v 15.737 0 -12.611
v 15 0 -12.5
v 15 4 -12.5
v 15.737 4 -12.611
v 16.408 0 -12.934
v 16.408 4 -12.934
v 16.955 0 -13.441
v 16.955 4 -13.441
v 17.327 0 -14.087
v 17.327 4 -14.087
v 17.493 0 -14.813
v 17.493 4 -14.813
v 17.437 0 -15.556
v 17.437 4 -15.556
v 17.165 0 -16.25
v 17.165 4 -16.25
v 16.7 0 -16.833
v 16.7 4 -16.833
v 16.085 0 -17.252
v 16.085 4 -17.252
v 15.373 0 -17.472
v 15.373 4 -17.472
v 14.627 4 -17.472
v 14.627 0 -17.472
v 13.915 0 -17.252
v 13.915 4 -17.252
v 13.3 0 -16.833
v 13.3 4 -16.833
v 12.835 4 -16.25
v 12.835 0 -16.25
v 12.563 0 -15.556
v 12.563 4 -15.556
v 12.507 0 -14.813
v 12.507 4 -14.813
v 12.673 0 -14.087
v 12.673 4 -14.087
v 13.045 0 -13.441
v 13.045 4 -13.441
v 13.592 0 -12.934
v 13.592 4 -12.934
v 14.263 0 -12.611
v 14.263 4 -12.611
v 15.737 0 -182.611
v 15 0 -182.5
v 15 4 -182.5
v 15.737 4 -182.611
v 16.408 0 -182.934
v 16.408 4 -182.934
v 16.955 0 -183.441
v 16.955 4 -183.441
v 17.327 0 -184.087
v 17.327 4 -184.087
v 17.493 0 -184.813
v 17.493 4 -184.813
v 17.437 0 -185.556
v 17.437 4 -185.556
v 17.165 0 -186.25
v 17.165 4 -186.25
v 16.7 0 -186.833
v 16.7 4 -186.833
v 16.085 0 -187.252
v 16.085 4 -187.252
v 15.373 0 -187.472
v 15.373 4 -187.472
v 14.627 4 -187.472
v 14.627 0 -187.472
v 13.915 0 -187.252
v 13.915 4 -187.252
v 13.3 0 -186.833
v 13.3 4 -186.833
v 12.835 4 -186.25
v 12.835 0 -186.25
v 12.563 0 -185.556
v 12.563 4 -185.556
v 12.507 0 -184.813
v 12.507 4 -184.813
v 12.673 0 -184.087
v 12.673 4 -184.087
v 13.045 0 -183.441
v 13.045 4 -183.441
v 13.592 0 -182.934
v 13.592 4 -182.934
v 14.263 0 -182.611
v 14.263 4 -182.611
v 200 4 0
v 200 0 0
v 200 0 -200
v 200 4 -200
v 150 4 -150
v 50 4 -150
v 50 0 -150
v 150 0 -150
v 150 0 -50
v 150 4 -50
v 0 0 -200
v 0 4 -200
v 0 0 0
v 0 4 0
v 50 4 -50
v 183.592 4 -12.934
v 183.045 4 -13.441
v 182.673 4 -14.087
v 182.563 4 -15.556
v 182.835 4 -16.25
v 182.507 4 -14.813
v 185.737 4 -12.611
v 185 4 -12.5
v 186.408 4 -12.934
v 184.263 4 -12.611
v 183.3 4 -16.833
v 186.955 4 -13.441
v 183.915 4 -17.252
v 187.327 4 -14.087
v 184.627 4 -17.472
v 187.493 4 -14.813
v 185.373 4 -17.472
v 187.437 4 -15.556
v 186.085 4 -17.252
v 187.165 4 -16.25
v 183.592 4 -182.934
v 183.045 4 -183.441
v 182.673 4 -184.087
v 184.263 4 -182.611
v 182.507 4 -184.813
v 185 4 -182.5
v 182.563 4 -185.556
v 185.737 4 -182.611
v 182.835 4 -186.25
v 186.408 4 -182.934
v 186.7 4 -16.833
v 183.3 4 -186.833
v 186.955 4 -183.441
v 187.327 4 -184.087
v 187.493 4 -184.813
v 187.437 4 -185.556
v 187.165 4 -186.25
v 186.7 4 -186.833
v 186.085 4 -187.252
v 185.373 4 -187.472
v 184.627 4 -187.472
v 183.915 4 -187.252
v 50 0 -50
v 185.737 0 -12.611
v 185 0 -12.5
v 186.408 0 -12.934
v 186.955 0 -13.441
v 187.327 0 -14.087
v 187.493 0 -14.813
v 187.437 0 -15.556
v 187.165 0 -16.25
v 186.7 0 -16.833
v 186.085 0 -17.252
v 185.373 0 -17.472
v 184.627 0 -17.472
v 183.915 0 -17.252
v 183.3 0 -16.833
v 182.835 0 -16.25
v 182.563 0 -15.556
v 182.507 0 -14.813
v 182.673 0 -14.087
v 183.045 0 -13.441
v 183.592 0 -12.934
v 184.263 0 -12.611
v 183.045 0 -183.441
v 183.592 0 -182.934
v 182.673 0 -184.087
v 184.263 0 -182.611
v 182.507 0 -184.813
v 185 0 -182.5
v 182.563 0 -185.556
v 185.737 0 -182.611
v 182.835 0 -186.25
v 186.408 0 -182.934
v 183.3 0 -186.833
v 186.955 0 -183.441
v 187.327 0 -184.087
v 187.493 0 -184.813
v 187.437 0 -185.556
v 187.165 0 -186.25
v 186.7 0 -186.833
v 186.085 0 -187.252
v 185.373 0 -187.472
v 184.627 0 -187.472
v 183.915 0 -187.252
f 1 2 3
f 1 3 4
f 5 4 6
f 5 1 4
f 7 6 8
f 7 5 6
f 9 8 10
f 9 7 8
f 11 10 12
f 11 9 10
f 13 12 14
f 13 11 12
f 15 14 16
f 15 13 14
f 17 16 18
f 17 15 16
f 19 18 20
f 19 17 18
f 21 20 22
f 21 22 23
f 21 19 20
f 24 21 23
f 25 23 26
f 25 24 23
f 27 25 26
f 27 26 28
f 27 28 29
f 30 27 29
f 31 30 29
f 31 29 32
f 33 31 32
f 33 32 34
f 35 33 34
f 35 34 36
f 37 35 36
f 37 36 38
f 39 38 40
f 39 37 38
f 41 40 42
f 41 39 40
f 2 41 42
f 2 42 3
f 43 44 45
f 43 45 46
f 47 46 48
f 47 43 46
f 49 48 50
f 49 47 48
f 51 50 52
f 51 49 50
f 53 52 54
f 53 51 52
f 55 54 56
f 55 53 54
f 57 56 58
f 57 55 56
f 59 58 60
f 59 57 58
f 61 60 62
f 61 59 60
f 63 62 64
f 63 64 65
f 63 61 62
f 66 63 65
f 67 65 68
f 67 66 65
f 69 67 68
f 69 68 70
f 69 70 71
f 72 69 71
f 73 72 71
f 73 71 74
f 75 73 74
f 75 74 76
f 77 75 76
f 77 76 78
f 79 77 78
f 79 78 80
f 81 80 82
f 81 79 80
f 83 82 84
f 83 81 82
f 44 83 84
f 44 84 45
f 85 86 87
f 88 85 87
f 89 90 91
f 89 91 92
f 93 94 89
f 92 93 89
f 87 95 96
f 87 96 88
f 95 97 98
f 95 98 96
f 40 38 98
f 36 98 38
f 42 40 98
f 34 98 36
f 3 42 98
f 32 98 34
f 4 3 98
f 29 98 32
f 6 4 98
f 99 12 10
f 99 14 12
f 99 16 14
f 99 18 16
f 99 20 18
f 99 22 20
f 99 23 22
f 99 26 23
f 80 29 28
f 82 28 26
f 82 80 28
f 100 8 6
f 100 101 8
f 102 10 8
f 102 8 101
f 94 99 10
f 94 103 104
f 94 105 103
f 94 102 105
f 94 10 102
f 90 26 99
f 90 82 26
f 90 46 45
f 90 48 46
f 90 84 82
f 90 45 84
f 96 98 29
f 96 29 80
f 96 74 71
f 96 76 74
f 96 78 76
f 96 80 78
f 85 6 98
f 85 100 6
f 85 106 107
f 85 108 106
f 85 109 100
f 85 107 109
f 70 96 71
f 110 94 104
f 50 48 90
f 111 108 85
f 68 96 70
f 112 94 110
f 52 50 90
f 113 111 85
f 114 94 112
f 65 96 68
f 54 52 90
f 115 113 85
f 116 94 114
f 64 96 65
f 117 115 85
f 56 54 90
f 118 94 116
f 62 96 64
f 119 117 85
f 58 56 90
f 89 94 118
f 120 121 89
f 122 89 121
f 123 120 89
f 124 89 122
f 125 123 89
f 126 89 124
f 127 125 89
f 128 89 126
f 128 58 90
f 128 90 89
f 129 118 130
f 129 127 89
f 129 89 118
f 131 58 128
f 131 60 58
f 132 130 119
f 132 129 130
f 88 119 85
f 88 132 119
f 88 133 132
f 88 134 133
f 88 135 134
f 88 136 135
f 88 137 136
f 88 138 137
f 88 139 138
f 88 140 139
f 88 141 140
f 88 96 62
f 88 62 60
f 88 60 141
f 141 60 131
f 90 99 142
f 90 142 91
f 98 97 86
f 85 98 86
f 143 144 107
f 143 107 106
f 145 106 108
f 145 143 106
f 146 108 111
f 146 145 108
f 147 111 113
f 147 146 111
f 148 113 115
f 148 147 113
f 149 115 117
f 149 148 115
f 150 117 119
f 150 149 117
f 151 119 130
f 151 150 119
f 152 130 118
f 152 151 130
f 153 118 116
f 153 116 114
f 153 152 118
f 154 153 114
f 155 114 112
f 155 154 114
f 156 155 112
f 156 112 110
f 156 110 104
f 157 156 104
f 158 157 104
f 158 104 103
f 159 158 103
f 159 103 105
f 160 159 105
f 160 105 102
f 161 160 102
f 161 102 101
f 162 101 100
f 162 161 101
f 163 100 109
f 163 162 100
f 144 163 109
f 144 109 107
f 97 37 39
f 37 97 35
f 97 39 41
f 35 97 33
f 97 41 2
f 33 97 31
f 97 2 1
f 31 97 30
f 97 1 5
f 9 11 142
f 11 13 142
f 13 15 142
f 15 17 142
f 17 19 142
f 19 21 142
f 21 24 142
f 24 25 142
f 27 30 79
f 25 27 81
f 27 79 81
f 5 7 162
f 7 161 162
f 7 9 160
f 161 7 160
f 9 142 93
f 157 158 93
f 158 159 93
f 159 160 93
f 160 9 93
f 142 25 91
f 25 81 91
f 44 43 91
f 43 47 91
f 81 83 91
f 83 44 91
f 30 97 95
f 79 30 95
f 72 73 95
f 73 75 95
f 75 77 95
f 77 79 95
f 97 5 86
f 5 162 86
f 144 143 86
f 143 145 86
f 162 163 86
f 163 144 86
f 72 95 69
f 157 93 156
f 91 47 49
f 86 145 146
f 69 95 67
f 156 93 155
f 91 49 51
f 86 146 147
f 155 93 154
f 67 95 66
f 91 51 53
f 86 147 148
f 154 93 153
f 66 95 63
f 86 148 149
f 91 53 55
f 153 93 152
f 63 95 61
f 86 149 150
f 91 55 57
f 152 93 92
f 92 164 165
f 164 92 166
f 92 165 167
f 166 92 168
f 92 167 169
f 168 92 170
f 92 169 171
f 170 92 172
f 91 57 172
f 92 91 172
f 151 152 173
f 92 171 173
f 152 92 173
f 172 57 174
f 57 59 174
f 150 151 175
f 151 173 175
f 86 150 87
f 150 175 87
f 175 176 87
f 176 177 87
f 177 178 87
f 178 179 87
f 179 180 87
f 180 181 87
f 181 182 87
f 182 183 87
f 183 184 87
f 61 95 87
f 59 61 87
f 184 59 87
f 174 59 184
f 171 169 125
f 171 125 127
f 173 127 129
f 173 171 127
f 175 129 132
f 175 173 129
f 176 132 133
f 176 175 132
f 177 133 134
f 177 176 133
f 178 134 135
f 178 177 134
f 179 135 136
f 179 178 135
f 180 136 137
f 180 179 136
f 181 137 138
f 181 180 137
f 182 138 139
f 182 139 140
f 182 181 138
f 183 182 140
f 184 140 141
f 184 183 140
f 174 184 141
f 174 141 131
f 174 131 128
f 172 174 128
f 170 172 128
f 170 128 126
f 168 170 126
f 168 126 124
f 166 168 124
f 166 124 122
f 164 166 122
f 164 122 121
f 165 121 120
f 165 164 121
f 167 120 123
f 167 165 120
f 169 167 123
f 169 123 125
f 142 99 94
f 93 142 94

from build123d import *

# Parameters (mm, degrees)
CROQUIS1_W              = 200
CROQUIS1_H              = 200
CROQUIS1_R              = 2.5
SALIENTE_EXTRUIR1_DEPTH = 4
CROQUIS2_W              = 100
CROQUIS2_H              = 100
CORTAR_EXTRUIR1_DEPTH   = 4


with BuildPart() as part:
    # Croquis1 → Saliente-Extruir1 (new body)
    with BuildSketch(Plane(origin=(0, 0, 0), x_dir=(1, 0, 0), z_dir=(0, 1, 0))):
        with Locations((100, 100)):
            Rectangle(CROQUIS1_W, CROQUIS1_H)
        with Locations(Location((15, 185, 0), (0, 0, 270))):
            Circle(CROQUIS1_R, mode=Mode.SUBTRACT)
        with Locations(Location((185, 185, 0), (0, 0, 270))):
            Circle(CROQUIS1_R, mode=Mode.SUBTRACT)
        with Locations(Location((185, 15, 0), (0, 0, 270))):
            Circle(CROQUIS1_R, mode=Mode.SUBTRACT)
        with Locations(Location((15, 15, 0), (0, 0, 270))):
            Circle(CROQUIS1_R, mode=Mode.SUBTRACT)
    extrude(amount=SALIENTE_EXTRUIR1_DEPTH)

    # Croquis2 → Cortar-Extruir1 (cut)
    with BuildSketch(Plane(origin=(0, 4, 0), x_dir=(1, 0, 0), z_dir=(0, 1, 0))):
        with Locations((100, 100)):
            Rectangle(CROQUIS2_W, CROQUIS2_H)
    extrude(amount=-CORTAR_EXTRUIR1_DEPTH, mode=Mode.SUBTRACT)


solid = part.part
